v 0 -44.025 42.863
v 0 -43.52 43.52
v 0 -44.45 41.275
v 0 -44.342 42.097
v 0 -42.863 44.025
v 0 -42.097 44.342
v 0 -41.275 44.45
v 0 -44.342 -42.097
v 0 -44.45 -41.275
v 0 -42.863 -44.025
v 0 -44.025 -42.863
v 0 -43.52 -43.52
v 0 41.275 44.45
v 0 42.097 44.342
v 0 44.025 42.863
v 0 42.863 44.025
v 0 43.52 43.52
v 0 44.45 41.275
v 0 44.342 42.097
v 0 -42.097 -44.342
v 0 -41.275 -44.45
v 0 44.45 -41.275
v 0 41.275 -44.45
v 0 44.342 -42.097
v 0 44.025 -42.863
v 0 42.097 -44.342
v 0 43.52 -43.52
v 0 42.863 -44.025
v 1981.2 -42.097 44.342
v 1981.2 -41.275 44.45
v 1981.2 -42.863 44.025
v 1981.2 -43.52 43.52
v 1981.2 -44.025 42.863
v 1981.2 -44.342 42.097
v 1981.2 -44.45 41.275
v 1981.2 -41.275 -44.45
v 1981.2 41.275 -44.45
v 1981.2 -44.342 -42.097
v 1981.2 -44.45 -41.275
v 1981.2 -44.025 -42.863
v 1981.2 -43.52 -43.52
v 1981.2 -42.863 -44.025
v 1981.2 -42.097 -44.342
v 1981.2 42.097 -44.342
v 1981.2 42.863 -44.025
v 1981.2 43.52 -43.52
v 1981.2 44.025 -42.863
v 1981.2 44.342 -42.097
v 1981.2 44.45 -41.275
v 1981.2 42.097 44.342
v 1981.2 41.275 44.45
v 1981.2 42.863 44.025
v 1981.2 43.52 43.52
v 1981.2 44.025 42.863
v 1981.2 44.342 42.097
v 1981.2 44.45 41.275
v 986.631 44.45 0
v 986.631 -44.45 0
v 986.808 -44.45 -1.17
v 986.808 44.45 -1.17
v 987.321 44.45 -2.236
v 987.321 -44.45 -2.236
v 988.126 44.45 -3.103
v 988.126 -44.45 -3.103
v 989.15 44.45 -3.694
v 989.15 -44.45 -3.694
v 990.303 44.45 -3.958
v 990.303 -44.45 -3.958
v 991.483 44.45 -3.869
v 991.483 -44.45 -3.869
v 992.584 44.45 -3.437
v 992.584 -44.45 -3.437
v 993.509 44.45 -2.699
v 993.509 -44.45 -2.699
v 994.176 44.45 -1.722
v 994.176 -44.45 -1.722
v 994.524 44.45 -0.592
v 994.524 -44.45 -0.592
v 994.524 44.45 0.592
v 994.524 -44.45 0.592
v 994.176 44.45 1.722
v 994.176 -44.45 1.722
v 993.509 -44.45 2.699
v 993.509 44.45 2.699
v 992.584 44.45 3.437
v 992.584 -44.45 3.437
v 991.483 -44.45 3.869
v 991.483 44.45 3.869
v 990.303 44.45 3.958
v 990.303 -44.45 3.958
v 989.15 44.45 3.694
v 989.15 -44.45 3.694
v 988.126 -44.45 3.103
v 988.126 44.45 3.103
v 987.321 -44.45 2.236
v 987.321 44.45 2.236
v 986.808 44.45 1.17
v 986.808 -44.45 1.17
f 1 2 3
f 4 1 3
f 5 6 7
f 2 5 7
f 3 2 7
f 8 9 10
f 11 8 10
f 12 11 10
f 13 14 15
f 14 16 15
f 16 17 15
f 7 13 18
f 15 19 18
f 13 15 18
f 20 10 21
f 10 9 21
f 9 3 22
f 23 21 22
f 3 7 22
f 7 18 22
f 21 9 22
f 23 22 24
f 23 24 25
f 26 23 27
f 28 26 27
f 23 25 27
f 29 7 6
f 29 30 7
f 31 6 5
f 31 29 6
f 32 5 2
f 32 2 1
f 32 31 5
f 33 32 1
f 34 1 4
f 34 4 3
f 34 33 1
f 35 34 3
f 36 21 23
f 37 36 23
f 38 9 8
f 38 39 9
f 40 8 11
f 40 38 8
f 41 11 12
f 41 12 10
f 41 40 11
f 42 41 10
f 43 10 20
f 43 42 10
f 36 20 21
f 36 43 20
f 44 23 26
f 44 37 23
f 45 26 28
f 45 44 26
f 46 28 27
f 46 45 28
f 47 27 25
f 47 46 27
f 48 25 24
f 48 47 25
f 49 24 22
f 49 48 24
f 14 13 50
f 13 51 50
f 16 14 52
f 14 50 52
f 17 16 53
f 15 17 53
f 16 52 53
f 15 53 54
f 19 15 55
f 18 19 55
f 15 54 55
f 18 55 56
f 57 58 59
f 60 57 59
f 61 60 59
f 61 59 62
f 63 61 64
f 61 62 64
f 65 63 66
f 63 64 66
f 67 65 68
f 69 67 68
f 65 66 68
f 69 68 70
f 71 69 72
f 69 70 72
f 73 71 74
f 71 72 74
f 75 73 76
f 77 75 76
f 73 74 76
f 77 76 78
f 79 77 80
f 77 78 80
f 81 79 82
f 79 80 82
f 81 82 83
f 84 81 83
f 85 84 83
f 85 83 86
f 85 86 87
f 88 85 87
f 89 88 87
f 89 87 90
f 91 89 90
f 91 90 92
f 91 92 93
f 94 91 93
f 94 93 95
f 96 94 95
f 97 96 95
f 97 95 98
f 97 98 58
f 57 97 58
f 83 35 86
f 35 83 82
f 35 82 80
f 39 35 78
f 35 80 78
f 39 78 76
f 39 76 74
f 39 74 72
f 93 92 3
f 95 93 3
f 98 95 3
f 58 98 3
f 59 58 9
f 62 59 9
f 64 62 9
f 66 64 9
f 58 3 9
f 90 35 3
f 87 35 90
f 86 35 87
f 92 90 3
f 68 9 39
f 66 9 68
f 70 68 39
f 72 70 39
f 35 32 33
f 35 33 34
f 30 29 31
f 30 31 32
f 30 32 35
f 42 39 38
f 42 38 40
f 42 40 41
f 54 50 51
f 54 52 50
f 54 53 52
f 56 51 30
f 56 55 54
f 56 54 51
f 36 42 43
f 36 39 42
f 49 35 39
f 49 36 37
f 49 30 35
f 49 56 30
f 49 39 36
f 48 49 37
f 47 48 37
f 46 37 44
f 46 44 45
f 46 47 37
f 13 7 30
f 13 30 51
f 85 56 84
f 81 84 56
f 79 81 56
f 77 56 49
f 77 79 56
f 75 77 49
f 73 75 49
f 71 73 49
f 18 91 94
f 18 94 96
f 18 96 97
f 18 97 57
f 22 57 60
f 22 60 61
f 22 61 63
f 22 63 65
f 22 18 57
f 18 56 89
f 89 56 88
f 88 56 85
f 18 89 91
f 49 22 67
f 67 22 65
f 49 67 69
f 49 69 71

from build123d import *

# Parameters (mm, degrees)
SKETCH1_W                      = 88.9
SKETCH1_H                      = 88.9
BOSS_EXTRUDE1_DEPTH            = 1981.2
FILLET1_R                      = 3.175
F_5_16_0_3125_DIAMETER_HOLE1_D = 7.9375


with BuildPart() as part:
    # Sketch1 → Boss-Extrude1 (new body)
    with BuildSketch(Plane(origin=(0, 0, 0), x_dir=(0, 0, -1), z_dir=(1, 0, 0))):
        Rectangle(SKETCH1_W, SKETCH1_H)
    extrude(amount=BOSS_EXTRUDE1_DEPTH)

    # Fillet1
    fillet1_edges = [part.edges().sort_by_distance(p)[0] for p in [
        (990.6, -44.45, -44.45),
        (990.6, -44.45, 44.45),
        (990.6, 44.45, 44.45),
        (990.6, 44.45, -44.45),
    ]]
    fillet(fillet1_edges, radius=FILLET1_R)

    # 5/16 (0.3125) Diameter Hole1 (through all)
    with Locations(Plane(origin=(0, 44.45, 0), x_dir=(1, 0, 0), z_dir=(0, 1, 0))):
        with Locations((990.6, 0)):
            Hole(F_5_16_0_3125_DIAMETER_HOLE1_D / 2)


solid = part.part
